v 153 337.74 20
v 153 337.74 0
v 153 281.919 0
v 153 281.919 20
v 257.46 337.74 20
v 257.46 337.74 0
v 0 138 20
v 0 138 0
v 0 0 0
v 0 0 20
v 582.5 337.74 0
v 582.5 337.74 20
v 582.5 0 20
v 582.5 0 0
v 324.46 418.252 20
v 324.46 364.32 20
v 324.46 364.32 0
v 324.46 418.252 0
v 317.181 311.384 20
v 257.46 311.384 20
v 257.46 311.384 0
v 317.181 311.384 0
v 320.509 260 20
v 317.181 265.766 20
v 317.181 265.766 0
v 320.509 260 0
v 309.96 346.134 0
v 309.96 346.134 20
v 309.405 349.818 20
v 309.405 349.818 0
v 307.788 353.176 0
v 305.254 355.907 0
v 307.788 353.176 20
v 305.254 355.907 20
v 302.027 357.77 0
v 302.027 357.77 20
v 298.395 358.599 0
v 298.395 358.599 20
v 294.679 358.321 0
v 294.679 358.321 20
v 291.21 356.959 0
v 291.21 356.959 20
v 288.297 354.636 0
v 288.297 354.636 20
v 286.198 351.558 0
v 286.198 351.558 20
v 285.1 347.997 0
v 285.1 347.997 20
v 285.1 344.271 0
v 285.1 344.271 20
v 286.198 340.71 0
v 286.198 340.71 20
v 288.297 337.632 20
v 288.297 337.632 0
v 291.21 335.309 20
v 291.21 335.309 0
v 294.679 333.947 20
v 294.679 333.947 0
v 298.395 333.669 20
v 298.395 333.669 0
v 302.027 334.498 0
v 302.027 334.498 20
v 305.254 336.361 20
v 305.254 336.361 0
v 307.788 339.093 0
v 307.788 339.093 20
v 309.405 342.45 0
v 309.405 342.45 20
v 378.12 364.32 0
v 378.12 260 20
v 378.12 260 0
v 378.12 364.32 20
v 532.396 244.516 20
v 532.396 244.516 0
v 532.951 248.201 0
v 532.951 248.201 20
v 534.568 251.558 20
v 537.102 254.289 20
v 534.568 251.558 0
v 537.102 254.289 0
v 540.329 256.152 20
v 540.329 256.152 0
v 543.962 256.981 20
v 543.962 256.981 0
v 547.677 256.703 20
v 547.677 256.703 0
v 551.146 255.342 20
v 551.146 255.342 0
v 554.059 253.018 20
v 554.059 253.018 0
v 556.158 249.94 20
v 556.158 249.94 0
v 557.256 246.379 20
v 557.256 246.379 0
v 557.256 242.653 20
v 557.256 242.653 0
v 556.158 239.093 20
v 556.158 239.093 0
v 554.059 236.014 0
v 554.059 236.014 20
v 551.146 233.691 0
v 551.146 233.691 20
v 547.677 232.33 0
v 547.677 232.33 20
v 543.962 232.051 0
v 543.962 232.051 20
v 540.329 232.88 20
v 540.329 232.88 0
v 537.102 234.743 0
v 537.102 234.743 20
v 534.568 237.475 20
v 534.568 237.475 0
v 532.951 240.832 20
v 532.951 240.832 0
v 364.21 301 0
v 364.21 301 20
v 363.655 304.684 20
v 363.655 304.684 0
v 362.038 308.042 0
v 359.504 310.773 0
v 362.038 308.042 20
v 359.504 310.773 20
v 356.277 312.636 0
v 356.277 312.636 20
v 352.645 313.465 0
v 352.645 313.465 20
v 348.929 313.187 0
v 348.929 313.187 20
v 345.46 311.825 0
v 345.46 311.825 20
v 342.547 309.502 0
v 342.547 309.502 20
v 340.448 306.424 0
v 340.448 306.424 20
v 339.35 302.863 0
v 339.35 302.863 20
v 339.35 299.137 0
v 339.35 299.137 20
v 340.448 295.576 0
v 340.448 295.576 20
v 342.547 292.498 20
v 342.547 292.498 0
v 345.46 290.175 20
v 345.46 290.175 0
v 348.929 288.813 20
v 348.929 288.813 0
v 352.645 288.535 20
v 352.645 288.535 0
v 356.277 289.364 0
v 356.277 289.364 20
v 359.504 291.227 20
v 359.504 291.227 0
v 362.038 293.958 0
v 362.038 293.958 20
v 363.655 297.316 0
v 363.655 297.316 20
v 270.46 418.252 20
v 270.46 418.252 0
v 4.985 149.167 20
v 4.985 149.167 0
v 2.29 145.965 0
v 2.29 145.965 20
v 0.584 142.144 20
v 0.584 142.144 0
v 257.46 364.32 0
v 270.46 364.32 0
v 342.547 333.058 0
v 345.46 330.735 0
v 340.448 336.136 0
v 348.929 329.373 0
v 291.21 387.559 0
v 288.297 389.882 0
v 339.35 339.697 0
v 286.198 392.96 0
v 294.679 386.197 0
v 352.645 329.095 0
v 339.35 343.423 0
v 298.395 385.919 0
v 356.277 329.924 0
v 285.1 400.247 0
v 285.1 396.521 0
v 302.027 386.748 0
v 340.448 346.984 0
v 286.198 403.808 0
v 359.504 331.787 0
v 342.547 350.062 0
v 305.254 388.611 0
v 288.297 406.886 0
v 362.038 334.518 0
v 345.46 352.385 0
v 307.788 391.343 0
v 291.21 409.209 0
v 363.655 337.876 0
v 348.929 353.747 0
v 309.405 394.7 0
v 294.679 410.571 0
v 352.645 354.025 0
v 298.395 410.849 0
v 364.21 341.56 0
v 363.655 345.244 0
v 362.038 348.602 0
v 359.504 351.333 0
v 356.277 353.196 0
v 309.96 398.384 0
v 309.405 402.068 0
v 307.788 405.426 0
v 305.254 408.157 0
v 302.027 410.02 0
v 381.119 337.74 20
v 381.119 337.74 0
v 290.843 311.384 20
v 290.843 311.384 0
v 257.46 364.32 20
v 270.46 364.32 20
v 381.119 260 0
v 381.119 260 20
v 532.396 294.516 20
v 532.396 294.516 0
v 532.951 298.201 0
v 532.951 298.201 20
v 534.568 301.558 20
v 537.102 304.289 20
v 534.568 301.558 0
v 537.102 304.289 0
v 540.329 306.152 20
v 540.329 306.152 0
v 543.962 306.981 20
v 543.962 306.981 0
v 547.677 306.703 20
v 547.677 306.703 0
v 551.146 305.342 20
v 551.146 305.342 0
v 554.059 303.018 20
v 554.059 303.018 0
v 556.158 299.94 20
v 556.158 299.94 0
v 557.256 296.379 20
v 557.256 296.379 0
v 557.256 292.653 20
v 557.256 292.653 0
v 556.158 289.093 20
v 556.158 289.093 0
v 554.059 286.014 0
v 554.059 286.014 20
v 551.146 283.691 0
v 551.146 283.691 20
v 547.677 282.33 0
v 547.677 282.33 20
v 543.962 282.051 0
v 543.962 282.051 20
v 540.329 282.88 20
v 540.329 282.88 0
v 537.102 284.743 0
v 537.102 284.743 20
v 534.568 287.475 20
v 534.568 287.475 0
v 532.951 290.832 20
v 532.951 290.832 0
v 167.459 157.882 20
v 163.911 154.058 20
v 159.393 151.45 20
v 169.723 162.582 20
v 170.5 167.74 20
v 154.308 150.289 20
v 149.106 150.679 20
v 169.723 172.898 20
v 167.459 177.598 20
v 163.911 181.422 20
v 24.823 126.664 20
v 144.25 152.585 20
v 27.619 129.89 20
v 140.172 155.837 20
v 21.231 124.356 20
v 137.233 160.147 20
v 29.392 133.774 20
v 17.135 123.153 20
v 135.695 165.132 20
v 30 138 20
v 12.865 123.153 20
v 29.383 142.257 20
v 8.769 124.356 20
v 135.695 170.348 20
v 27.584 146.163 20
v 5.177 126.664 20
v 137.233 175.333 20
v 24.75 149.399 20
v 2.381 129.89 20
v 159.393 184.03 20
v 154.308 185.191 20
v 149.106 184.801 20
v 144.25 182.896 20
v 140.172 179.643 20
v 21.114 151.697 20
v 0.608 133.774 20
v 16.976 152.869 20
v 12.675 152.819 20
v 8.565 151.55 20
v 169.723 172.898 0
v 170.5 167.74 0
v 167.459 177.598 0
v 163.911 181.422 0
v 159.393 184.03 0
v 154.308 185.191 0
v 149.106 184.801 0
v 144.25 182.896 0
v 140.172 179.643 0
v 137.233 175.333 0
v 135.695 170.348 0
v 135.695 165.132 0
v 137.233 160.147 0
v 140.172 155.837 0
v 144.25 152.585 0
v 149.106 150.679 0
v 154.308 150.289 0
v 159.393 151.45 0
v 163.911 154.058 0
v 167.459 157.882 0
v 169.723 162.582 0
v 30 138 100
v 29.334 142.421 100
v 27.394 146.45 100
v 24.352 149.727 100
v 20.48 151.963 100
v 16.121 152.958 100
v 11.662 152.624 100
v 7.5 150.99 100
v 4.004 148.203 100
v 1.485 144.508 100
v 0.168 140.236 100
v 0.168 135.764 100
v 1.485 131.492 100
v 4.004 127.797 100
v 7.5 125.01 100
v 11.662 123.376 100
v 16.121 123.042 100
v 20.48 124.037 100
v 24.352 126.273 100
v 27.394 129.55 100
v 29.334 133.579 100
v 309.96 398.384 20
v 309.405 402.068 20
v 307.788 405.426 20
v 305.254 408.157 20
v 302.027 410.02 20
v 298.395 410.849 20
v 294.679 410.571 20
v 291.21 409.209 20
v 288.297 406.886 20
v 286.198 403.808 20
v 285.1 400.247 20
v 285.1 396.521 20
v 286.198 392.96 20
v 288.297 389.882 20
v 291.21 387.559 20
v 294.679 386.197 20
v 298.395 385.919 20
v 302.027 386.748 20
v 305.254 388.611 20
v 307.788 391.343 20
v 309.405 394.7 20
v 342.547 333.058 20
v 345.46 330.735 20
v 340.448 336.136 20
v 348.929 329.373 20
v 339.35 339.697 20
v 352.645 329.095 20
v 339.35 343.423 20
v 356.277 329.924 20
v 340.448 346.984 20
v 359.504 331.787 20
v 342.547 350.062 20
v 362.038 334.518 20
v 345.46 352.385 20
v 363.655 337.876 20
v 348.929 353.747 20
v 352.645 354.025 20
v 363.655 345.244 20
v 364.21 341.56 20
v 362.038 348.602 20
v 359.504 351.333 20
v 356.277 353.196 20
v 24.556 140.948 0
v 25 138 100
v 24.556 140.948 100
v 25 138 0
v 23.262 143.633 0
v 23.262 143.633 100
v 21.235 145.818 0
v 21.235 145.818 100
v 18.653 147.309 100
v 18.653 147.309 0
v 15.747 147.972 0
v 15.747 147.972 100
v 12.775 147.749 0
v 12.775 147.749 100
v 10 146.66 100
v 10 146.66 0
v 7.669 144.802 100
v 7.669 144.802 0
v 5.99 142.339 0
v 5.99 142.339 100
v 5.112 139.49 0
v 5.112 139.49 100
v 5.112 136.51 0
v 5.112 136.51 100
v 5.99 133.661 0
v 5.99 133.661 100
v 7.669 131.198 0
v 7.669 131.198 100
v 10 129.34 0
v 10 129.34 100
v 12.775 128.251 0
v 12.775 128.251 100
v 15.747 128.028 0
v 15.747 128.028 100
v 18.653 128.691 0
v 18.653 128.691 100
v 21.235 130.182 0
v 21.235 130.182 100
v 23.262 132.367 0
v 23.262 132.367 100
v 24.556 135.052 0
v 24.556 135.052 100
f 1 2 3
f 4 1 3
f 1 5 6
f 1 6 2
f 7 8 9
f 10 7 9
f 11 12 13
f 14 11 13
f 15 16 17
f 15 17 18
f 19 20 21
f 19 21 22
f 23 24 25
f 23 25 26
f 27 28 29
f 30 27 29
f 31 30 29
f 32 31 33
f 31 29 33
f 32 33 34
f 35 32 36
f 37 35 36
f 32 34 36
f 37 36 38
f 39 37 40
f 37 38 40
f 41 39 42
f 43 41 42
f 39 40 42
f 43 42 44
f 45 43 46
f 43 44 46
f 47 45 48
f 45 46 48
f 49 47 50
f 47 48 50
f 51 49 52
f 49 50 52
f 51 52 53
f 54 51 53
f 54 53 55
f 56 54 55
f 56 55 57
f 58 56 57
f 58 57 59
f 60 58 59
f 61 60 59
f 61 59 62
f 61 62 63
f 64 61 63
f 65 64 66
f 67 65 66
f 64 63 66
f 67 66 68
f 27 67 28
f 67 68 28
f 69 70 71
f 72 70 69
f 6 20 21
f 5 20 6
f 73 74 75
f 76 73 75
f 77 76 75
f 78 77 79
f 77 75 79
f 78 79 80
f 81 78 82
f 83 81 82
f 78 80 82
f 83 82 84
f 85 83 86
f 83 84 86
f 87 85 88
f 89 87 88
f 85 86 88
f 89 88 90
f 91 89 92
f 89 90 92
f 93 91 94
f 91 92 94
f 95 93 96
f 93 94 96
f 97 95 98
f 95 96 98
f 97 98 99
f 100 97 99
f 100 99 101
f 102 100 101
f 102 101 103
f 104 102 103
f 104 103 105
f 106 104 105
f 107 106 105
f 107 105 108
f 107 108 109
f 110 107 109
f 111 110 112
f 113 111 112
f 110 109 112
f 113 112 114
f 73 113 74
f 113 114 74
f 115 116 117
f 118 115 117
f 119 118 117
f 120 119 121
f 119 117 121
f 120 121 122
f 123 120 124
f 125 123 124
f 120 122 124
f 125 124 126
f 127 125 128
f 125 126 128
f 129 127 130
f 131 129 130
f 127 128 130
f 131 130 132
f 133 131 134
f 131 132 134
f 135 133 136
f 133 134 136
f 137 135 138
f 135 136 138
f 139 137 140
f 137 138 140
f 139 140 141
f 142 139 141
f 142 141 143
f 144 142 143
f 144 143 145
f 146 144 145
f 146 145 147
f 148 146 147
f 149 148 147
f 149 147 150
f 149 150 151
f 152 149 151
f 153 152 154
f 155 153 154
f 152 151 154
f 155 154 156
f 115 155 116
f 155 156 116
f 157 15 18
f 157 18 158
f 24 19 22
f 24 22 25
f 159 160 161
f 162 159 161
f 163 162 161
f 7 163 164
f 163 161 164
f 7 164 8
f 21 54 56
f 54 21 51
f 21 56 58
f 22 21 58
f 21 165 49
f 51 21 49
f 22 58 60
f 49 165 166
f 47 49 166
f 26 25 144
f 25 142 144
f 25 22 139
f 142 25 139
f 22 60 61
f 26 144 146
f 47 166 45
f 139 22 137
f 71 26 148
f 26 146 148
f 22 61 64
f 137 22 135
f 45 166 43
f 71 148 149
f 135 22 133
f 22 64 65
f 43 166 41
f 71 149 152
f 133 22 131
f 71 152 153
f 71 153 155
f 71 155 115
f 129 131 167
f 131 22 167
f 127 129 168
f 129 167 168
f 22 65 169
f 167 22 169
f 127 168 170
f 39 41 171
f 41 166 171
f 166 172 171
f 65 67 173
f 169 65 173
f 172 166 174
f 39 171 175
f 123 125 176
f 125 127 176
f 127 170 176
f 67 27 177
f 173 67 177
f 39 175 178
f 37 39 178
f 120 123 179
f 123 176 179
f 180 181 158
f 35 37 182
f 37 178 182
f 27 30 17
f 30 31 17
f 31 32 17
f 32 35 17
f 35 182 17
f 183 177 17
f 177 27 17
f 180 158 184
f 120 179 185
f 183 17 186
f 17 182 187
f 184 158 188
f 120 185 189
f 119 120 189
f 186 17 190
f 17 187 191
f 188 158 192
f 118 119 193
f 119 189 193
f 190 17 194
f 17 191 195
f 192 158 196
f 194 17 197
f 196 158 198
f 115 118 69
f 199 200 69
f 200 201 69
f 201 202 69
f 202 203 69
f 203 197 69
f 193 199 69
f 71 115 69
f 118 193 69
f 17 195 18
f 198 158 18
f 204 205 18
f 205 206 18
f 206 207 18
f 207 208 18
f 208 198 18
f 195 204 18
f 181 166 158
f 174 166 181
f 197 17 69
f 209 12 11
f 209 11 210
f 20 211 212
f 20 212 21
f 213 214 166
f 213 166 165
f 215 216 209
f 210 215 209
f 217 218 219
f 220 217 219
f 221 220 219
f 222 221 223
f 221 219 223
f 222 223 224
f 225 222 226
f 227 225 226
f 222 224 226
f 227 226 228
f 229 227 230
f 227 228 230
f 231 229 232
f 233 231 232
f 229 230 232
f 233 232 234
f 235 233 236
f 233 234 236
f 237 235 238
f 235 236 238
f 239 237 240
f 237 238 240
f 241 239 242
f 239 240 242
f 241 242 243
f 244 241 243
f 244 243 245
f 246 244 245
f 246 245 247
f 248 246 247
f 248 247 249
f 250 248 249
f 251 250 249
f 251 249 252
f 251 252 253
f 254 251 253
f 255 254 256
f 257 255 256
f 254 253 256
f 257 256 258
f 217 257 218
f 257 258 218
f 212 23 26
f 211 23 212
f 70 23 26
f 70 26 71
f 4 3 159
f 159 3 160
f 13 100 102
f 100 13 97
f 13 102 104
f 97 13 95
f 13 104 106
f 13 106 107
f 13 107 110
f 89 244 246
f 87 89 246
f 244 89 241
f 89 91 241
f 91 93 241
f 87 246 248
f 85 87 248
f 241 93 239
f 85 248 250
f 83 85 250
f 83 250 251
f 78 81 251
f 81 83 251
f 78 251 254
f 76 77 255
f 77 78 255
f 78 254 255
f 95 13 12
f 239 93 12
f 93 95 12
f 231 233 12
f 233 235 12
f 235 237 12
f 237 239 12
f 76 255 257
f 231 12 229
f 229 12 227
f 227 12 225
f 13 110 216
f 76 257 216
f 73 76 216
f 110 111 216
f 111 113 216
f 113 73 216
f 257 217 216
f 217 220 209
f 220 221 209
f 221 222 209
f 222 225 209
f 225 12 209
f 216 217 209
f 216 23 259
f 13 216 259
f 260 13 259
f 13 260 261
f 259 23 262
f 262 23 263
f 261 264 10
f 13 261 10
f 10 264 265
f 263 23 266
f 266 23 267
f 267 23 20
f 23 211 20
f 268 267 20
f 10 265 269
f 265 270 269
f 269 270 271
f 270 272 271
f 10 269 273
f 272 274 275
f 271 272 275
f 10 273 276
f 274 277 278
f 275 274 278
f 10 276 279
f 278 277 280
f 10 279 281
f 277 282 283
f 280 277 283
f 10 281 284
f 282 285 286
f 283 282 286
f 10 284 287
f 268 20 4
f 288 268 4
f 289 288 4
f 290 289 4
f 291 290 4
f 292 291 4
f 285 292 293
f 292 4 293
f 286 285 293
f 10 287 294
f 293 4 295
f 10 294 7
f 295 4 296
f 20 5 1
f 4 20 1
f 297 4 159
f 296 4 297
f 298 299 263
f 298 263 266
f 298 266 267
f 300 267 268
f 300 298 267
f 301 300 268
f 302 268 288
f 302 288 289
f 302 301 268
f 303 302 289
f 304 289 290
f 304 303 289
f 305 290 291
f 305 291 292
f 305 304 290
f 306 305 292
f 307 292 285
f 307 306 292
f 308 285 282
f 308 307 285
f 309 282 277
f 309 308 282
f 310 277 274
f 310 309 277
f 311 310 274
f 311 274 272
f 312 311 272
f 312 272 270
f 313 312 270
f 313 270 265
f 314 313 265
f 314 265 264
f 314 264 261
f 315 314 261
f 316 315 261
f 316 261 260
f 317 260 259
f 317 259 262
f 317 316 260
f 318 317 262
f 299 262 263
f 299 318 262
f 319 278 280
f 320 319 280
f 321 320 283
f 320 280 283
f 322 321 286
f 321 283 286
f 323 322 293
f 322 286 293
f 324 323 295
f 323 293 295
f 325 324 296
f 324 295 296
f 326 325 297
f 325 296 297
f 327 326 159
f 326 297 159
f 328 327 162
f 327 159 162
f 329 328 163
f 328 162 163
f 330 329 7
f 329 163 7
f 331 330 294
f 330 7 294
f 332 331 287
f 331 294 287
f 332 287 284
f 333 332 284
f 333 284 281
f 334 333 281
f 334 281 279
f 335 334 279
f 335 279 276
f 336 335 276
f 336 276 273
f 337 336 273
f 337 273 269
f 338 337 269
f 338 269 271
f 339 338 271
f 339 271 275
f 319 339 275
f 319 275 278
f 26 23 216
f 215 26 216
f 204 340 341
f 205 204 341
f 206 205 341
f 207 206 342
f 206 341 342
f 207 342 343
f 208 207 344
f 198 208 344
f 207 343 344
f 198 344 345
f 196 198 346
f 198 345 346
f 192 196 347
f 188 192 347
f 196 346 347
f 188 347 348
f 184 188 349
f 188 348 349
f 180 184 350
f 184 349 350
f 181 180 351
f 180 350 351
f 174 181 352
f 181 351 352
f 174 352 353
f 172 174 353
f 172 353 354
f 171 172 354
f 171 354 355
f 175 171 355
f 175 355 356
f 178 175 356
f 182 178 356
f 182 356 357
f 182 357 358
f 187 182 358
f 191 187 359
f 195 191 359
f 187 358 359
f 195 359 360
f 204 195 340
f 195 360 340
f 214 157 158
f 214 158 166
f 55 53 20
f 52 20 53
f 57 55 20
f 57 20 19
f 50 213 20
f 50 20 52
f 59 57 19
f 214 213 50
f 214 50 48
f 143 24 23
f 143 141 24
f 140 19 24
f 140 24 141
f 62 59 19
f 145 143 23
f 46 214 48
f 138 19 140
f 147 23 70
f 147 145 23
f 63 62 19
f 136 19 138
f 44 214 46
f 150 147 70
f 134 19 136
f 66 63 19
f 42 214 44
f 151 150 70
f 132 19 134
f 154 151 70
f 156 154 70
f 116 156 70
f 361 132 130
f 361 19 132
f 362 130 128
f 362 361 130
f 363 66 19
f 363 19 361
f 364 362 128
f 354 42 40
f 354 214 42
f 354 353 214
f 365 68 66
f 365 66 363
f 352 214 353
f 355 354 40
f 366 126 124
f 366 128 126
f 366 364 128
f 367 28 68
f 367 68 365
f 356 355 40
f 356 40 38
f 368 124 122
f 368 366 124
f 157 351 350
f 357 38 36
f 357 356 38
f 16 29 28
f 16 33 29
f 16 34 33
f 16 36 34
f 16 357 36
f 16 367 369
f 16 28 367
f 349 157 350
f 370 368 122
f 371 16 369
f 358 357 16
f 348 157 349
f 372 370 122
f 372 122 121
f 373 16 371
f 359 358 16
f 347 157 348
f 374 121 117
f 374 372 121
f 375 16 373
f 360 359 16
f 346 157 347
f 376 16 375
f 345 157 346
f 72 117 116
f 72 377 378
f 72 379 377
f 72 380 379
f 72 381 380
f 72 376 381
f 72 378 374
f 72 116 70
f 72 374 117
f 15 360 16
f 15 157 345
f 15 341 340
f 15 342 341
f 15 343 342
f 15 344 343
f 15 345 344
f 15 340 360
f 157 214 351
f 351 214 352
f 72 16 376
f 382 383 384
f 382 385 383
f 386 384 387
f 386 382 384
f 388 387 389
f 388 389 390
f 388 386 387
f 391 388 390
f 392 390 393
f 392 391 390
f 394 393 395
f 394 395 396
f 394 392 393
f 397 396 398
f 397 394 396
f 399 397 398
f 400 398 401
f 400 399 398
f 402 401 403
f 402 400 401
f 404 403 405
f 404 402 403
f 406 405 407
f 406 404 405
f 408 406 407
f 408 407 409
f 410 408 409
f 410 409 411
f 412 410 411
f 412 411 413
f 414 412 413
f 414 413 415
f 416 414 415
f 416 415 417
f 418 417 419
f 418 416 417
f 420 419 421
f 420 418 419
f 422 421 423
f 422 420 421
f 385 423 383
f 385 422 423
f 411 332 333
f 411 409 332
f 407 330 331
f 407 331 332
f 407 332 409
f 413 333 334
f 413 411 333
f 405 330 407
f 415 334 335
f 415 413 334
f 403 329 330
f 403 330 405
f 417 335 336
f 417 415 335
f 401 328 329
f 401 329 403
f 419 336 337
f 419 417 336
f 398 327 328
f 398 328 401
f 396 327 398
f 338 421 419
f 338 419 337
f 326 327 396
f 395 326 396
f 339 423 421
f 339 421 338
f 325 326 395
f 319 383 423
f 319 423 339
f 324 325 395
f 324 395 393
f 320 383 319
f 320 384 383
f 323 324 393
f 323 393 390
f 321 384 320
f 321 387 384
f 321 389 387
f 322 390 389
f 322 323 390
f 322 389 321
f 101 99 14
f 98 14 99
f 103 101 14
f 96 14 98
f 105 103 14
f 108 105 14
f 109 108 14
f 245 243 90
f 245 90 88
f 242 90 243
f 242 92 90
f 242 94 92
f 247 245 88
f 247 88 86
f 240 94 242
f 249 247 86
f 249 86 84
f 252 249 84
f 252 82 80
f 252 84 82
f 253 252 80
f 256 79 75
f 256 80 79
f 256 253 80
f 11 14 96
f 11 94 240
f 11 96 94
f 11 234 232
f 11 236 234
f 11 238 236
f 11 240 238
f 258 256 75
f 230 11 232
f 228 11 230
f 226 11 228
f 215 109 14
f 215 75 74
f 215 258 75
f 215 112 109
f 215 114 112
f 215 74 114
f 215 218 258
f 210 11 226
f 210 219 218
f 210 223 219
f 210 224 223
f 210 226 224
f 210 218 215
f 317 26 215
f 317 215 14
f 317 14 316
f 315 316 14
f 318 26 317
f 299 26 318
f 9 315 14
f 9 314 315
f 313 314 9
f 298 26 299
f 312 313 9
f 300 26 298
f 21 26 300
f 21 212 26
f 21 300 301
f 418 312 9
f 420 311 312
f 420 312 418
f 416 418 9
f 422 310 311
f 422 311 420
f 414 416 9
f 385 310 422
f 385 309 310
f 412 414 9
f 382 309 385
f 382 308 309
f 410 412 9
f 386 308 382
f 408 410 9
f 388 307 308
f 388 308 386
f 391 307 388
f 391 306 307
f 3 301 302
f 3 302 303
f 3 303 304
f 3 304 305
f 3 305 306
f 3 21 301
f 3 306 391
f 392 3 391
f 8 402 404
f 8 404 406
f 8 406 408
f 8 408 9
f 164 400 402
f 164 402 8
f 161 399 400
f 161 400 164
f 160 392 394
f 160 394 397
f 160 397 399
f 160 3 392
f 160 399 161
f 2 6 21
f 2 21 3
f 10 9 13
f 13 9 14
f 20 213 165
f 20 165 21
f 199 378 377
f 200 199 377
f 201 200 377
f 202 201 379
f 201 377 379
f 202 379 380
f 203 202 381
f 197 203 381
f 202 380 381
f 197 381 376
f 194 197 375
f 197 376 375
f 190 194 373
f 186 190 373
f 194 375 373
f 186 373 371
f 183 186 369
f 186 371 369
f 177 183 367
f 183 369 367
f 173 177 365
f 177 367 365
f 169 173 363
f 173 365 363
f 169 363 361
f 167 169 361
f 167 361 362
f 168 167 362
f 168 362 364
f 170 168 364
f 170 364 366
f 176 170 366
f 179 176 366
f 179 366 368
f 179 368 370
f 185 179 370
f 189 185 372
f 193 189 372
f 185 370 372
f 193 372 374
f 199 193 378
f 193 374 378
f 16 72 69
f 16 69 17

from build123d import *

# Parameters (mm, degrees)
SKETCH1_R           = 17.5
SKETCH1_R_2         = 10
BOSS_EXTRUDE1_DEPTH = 20
SKETCH2_R           = 15
SKETCH2_R_2         = 10
BOSS_EXTRUDE2_DEPTH = 80
BOSS_EXTRUDE6_DEPTH = 20
BOSS_EXTRUDE7_DEPTH = 20
SKETCH10_R          = 12.5
BOSS_EXTRUDE9_DEPTH = 20
SKETCH11_R          = 12.5
CUT_EXTRUDE1_DEPTH  = 20


with BuildPart() as part:
    # Sketch1 → Boss-Extrude1 (new body)
    with BuildSketch(Plane.XY):
        with BuildLine():
            Line((0, 138), (0, 0))
            Line((0, 0), (582.5, 0))
            Line((582.5, 0), (582.5, 51.183650965))
            Line((582.5, 51.183650965), (572.5, 51.183650965))
            Line((572.5, 51.183650965), (374.649400312, 86.070049839))
            Line((374.649400312, 86.070049839), (244.94, 310.733321399))
            ThreePointArc((244.94, 310.733321399), (200.912248971, 330.848790378), (153, 337.740187298))
            Line((153, 337.740187298), (153, 281.918848091))
            Line((153, 281.918848091), (4.984782256, 149.166710059))
            ThreePointArc((4.984782256, 149.166710059), (1.302769146, 144.114398329), (0, 138))
        make_face()
        with Locations((153, 167.740187298)):
            Circle(SKETCH1_R, mode=Mode.SUBTRACT)
        with Locations((15, 138)):
            Circle(SKETCH1_R_2, mode=Mode.SUBTRACT)
    extrude(amount=BOSS_EXTRUDE1_DEPTH)

    # Sketch2 → Boss-Extrude2 (add)
    with BuildSketch(Plane.XY.offset(20)):
        with Locations((15, 138)):
            Circle(SKETCH2_R)
        with Locations((15, 138)):
            Circle(SKETCH2_R_2, mode=Mode.SUBTRACT)
    extrude(amount=BOSS_EXTRUDE2_DEPTH)

    # Sketch4 → Boss-Extrude6 (add)
    with BuildSketch(Plane.XY.offset(20)):
        with BuildLine():
            Line((257.460495765, 337.740187298), (153, 337.740187298))
            ThreePointArc((153, 337.740187298), (200.912248971, 330.848790378), (244.94, 310.733321399))
            Line((244.94, 310.733321399), (374.649400312, 86.070049839))
            Line((374.649400312, 86.070049839), (426.173106487, 76.985030294))
            Line((426.173106487, 76.985030294), (290.842773548, 311.384042751))
            Line((290.842773548, 311.384042751), (257.460495765, 311.384042751))
            Line((257.460495765, 311.384042751), (257.460495765, 337.740187298))
        make_face()
    extrude(amount=-BOSS_EXTRUDE6_DEPTH)

    # Sketch9 → Boss-Extrude7 (add)
    with BuildSketch(Plane.XY.offset(20)):
        Polygon((582.5, 337.740187298), (582.5, 51.183650965), (572.5, 51.183650965), (522.5, 60), (426.173106487, 76.985030294), (320.509364462, 260), (381.119364462, 260), (381.119364462, 337.740187298), (525.48, 337.740187298), align=None)
    extrude(amount=-BOSS_EXTRUDE7_DEPTH)

    # Sketch11 → Cut-Extrude1 (cut)
    with BuildSketch(Plane(origin=(0, 0, 0), x_dir=(-1, 0, 0), z_dir=(0, 0, -1))):
        with Locations((-544.895661023, 294.516190979)):
            Circle(SKETCH11_R)
        with Locations((-544.895661023, 244.516190979)):
            Circle(SKETCH11_R)
    extrude(amount=-CUT_EXTRUDE1_DEPTH, mode=Mode.SUBTRACT)


with BuildPart() as body_2:
    # Sketch10 → Boss-Extrude9 (new body)
    with BuildSketch(Plane.XY.offset(20)):
        Polygon((270.460495765, 418.251615442), (270.460495765, 364.320187298), (317.180522157, 364.320187298), (324.460495765, 364.320187298), (324.460495765, 418.251615442), align=None)
        with Locations((297.460495765, 398.384042751)):
            Circle(SKETCH10_R, mode=Mode.SUBTRACT)
        Polygon((270.460495765, 364.320187298), (257.460495765, 364.320187298), (257.460495765, 337.740187298), (257.460495765, 311.384042751), (290.842773548, 311.384042751), (317.180522157, 311.384042751), (317.180522157, 321.223855452), (317.180522157, 364.320187298), align=None)
        with Locations((297.460495765, 346.134042751)):
            Circle(SKETCH10_R, mode=Mode.SUBTRACT)
        Polygon((324.460495765, 364.320187298), (317.180522157, 364.320187298), (317.180522157, 321.223855452), (347.650508961, 321.223855452), (378.120495765, 321.223855452), (378.120495765, 364.320187298), align=None)
        with Locations((351.710495765, 341.56)):
            Circle(SKETCH10_R, mode=Mode.SUBTRACT)
        Polygon((347.650508961, 321.223855452), (317.180522157, 321.223855452), (317.180522157, 311.384042751), (317.180522157, 265.765724002), (320.509364462, 260), (378.120495765, 260), (378.120495765, 321.223855452), align=None)
        with Locations((351.710495765, 301)):
            Circle(SKETCH10_R, mode=Mode.SUBTRACT)
    extrude(amount=-BOSS_EXTRUDE9_DEPTH)


solid = Compound([part.part, body_2.part])
